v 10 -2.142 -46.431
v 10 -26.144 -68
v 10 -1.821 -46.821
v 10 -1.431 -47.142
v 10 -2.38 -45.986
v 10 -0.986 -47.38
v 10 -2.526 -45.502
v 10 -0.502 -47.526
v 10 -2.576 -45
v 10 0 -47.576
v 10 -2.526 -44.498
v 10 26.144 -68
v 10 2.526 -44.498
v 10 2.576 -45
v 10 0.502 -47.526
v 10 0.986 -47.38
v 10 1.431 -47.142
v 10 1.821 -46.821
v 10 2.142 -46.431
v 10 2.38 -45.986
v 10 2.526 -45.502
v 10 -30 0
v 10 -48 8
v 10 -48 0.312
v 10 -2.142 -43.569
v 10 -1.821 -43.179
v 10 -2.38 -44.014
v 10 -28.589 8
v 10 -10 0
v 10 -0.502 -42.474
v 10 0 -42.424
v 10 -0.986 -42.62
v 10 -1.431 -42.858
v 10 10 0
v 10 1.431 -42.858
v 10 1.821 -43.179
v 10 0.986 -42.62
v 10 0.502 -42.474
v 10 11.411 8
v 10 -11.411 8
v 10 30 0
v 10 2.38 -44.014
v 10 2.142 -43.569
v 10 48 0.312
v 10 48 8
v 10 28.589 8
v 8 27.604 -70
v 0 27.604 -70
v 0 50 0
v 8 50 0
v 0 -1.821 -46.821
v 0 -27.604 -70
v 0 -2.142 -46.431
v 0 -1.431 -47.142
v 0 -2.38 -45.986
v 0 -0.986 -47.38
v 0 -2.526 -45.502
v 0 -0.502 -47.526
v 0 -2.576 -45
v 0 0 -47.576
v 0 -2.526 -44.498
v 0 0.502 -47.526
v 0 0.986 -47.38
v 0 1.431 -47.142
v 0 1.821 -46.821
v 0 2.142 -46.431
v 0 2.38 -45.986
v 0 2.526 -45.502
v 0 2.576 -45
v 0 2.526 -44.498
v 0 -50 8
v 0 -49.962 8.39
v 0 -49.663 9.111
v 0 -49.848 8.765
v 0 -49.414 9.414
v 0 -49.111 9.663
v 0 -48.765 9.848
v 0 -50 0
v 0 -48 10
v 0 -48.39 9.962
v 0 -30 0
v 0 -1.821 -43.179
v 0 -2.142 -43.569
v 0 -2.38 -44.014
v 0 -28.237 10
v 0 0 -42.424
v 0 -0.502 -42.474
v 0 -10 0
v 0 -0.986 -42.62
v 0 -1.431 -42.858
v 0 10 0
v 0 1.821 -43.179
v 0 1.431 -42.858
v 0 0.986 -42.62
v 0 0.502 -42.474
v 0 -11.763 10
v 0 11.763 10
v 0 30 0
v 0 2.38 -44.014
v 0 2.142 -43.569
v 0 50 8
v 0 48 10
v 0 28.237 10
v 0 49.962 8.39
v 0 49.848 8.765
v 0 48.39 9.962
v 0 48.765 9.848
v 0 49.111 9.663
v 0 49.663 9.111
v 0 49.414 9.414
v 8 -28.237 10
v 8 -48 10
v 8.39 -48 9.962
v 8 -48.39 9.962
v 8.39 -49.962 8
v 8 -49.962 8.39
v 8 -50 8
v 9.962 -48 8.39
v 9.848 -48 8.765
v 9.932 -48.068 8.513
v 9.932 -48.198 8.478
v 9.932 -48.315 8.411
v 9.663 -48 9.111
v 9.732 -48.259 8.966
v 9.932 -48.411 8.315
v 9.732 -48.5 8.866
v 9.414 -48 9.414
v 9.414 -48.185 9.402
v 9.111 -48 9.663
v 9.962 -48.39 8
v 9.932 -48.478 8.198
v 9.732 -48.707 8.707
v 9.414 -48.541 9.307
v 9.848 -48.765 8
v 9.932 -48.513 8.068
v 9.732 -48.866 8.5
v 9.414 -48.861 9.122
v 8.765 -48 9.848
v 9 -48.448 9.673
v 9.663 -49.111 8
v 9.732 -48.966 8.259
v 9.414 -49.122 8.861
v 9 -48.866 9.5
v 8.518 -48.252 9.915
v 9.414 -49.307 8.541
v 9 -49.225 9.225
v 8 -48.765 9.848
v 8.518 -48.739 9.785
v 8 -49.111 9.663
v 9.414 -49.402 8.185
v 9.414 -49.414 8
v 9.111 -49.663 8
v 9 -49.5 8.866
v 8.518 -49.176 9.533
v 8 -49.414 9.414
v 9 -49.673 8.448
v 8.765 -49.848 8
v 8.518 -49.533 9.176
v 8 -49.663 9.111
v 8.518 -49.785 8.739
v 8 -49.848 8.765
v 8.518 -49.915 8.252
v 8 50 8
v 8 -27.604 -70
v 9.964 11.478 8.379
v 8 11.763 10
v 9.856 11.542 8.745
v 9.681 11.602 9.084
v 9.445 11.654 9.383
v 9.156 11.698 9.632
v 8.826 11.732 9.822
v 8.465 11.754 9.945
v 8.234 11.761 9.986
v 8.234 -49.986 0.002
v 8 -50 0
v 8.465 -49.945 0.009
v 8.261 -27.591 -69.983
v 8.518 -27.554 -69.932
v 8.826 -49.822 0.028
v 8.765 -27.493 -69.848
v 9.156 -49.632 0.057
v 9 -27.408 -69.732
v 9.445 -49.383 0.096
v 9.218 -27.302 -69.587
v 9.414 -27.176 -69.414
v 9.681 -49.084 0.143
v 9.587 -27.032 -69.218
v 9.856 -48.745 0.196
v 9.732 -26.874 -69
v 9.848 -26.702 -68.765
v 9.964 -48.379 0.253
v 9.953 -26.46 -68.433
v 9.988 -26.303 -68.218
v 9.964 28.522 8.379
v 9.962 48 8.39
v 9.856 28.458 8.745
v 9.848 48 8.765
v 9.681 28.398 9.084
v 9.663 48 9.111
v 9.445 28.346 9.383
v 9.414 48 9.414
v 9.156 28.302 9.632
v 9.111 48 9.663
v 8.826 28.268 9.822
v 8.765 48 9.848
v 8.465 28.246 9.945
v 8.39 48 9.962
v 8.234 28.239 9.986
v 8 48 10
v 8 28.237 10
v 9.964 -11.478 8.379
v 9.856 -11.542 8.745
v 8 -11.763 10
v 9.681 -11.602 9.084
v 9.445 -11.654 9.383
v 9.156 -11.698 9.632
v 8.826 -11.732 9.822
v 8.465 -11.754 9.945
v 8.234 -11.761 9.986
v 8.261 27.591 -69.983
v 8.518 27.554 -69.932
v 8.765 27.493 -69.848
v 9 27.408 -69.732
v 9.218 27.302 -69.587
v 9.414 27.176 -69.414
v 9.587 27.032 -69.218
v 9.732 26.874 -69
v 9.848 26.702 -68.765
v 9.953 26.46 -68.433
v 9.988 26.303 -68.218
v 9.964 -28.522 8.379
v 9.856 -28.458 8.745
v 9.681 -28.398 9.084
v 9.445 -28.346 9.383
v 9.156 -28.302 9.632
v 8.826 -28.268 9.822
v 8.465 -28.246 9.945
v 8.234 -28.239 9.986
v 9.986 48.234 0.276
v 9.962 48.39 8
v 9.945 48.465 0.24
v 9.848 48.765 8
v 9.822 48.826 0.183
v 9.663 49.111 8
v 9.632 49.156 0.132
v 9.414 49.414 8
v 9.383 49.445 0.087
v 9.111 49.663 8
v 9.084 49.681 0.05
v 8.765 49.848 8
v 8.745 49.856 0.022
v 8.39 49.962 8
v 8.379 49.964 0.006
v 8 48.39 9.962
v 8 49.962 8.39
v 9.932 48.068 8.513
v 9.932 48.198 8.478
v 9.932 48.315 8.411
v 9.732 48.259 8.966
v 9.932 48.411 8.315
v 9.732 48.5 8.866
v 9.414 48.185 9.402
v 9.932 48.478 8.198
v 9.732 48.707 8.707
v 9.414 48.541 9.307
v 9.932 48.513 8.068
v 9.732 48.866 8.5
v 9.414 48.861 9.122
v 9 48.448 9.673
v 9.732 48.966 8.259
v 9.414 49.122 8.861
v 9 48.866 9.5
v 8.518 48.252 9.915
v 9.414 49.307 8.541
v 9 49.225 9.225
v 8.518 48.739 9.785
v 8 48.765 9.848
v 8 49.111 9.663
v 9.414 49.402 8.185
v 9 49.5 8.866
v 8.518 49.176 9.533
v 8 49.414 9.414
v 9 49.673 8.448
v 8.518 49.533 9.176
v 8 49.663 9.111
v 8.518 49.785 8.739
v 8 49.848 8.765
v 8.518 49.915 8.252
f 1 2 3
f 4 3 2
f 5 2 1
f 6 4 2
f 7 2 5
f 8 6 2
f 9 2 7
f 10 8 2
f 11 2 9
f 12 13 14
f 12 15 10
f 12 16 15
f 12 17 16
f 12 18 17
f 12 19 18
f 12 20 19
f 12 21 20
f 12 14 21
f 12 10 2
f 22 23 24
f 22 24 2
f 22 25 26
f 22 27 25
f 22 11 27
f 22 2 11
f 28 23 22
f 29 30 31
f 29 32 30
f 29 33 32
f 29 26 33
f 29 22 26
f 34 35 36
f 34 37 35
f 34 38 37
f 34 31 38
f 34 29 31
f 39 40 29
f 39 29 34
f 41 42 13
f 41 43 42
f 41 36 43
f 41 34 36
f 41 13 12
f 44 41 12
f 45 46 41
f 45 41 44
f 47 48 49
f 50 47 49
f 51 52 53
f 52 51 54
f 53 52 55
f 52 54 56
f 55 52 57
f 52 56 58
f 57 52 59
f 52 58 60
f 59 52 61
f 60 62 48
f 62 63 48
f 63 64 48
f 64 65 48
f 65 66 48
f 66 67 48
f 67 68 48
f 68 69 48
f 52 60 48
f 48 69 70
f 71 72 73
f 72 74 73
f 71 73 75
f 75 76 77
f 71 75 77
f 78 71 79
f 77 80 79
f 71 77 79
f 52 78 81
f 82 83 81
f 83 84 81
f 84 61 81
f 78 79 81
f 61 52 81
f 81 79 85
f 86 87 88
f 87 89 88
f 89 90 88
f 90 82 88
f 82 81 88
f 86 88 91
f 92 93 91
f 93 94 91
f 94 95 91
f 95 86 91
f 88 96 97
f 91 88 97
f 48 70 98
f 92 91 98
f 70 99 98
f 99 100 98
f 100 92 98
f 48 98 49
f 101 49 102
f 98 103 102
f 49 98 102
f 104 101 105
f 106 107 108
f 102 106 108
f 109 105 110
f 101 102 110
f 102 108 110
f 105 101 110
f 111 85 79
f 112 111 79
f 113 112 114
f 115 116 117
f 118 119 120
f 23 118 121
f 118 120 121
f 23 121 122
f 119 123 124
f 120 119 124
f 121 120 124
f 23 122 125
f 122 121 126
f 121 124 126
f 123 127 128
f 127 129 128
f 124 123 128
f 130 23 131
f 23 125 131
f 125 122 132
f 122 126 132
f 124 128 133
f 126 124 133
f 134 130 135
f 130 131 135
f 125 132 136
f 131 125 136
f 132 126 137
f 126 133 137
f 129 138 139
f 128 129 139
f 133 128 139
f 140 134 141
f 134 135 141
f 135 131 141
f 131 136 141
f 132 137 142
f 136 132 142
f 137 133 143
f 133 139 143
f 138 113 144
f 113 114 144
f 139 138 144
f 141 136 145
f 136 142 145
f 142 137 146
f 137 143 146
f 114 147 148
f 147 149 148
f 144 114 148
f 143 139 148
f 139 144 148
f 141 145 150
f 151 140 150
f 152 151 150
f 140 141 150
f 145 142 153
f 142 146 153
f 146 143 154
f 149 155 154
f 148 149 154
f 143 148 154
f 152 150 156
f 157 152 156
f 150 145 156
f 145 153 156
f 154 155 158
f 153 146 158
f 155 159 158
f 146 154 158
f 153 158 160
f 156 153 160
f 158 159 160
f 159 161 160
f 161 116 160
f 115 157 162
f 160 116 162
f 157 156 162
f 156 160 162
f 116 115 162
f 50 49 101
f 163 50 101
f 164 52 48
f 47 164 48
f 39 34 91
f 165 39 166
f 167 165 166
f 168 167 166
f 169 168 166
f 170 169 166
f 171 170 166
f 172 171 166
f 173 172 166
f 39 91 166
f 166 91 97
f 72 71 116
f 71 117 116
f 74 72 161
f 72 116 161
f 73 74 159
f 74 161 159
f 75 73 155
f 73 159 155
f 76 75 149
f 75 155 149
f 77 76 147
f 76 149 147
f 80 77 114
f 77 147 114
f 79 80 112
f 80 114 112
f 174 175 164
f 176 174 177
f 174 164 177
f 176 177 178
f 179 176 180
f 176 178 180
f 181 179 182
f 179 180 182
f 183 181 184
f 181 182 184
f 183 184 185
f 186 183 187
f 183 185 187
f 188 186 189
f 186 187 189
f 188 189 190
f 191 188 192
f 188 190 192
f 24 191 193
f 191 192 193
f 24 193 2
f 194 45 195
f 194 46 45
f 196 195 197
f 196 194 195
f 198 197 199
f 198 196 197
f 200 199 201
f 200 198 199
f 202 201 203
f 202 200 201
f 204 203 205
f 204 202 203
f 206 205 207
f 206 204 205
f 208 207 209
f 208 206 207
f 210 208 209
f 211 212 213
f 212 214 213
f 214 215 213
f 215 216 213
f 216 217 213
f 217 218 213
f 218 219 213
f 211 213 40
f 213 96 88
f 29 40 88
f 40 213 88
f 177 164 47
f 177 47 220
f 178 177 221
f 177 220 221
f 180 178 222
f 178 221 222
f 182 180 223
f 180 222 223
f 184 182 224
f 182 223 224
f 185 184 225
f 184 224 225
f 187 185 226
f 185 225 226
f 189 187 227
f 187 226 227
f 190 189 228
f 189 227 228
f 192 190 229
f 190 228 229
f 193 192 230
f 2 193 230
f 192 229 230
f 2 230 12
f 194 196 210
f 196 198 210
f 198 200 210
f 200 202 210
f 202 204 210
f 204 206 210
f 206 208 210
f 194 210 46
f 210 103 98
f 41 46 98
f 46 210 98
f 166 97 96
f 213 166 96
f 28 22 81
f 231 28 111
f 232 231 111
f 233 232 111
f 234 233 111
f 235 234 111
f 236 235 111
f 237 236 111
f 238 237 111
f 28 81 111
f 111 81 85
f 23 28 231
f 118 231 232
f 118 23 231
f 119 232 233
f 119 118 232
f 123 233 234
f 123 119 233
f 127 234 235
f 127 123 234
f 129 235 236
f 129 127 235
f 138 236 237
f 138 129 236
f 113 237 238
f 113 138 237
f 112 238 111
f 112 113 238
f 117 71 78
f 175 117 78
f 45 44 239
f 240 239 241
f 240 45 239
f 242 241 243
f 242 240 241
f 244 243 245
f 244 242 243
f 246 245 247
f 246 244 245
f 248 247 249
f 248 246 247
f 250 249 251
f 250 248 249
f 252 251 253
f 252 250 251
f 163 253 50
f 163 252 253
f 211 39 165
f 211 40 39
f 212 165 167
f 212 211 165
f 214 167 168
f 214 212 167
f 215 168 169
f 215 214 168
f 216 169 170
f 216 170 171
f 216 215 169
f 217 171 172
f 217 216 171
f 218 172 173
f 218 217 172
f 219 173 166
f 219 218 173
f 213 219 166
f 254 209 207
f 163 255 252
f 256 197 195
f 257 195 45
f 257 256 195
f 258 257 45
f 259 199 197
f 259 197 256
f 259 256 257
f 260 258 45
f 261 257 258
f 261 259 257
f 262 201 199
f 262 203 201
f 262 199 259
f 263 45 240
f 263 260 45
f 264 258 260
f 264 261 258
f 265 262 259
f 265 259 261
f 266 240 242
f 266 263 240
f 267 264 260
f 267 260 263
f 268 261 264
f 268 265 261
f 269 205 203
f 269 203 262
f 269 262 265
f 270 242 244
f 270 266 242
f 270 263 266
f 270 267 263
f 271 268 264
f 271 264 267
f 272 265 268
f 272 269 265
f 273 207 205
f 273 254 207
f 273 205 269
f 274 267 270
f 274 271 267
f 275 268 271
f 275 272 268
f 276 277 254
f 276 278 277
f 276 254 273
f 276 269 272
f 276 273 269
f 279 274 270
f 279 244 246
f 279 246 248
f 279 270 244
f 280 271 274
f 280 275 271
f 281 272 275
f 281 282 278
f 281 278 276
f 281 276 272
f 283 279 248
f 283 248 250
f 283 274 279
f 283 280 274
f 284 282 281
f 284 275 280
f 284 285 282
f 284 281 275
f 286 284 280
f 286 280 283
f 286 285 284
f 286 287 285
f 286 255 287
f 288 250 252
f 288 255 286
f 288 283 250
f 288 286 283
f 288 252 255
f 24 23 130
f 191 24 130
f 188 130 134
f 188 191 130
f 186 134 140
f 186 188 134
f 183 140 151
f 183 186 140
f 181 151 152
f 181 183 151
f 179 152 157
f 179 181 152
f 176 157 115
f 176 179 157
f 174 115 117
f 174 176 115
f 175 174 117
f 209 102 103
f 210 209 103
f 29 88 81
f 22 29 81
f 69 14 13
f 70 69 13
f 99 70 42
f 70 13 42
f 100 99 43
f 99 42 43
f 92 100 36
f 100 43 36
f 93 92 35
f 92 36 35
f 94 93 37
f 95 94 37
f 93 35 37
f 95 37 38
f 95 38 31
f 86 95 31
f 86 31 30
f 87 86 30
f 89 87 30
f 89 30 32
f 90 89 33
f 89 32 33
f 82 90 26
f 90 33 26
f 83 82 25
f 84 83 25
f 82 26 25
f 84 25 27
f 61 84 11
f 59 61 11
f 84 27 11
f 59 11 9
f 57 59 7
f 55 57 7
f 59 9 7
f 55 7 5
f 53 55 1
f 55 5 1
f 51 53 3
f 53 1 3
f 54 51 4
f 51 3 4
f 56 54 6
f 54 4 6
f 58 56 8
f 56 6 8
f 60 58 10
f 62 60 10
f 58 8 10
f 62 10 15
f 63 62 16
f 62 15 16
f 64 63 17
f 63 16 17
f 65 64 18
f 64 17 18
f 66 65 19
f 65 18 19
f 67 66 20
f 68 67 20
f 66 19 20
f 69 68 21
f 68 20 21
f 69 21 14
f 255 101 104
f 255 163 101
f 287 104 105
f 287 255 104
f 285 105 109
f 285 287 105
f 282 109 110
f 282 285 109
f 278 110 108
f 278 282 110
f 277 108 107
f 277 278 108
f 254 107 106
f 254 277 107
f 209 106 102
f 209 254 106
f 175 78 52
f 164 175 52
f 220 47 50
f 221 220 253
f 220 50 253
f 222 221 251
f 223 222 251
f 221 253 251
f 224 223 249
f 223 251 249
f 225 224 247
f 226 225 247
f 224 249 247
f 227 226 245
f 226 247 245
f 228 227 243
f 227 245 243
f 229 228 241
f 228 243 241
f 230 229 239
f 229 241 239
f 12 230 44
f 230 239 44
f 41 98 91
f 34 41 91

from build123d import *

# Parameters (mm, degrees)
F1_DEPTH = 10
F2_R     = 2.575657
F3_DEPTH = 10
F4_R     = 2


with BuildPart() as f1:
    # F0 (on Right) → F1 (new body)
    with BuildSketch(Plane.YZ):
        Polygon((-27.603682, -70), (0, -70), (27.603682, -70), (50, 0), (50, 10), (28.23673, 10), (30, 0), (20, 0), (10, 0), (11.76327, 10), (0, 10), (-11.76327, 10), (-10, 0), (-20, 0), (-30, 0), (-28.23673, 10), (-50, 10), (-50, 0), align=None)
    extrude(amount=F1_DEPTH)

    # F2 (on face) → F3 (cut, through all)
    with BuildSketch(Plane.YZ.offset(10)):
        with Locations((0, -45)):
            Circle(F2_R)
    extrude(amount=-F3_DEPTH, mode=Mode.SUBTRACT)

    # F4
    f4_edges = [f1.edges().sort_by_distance(p)[0] for p in [
        (5, -50, 10),
        (5, 50, 10),
        (10, -39.118365, 10),
        (10, 0, 10),
        (10, 39.118365, 10),
        (10, -50, 5),
        (10, -38.801841, -35),
        (10, 38.801841, -35),
        (10, 50, 5),
        (10, 0, -70),
    ]]
    fillet(f4_edges, radius=F4_R)


solid = f1.part
